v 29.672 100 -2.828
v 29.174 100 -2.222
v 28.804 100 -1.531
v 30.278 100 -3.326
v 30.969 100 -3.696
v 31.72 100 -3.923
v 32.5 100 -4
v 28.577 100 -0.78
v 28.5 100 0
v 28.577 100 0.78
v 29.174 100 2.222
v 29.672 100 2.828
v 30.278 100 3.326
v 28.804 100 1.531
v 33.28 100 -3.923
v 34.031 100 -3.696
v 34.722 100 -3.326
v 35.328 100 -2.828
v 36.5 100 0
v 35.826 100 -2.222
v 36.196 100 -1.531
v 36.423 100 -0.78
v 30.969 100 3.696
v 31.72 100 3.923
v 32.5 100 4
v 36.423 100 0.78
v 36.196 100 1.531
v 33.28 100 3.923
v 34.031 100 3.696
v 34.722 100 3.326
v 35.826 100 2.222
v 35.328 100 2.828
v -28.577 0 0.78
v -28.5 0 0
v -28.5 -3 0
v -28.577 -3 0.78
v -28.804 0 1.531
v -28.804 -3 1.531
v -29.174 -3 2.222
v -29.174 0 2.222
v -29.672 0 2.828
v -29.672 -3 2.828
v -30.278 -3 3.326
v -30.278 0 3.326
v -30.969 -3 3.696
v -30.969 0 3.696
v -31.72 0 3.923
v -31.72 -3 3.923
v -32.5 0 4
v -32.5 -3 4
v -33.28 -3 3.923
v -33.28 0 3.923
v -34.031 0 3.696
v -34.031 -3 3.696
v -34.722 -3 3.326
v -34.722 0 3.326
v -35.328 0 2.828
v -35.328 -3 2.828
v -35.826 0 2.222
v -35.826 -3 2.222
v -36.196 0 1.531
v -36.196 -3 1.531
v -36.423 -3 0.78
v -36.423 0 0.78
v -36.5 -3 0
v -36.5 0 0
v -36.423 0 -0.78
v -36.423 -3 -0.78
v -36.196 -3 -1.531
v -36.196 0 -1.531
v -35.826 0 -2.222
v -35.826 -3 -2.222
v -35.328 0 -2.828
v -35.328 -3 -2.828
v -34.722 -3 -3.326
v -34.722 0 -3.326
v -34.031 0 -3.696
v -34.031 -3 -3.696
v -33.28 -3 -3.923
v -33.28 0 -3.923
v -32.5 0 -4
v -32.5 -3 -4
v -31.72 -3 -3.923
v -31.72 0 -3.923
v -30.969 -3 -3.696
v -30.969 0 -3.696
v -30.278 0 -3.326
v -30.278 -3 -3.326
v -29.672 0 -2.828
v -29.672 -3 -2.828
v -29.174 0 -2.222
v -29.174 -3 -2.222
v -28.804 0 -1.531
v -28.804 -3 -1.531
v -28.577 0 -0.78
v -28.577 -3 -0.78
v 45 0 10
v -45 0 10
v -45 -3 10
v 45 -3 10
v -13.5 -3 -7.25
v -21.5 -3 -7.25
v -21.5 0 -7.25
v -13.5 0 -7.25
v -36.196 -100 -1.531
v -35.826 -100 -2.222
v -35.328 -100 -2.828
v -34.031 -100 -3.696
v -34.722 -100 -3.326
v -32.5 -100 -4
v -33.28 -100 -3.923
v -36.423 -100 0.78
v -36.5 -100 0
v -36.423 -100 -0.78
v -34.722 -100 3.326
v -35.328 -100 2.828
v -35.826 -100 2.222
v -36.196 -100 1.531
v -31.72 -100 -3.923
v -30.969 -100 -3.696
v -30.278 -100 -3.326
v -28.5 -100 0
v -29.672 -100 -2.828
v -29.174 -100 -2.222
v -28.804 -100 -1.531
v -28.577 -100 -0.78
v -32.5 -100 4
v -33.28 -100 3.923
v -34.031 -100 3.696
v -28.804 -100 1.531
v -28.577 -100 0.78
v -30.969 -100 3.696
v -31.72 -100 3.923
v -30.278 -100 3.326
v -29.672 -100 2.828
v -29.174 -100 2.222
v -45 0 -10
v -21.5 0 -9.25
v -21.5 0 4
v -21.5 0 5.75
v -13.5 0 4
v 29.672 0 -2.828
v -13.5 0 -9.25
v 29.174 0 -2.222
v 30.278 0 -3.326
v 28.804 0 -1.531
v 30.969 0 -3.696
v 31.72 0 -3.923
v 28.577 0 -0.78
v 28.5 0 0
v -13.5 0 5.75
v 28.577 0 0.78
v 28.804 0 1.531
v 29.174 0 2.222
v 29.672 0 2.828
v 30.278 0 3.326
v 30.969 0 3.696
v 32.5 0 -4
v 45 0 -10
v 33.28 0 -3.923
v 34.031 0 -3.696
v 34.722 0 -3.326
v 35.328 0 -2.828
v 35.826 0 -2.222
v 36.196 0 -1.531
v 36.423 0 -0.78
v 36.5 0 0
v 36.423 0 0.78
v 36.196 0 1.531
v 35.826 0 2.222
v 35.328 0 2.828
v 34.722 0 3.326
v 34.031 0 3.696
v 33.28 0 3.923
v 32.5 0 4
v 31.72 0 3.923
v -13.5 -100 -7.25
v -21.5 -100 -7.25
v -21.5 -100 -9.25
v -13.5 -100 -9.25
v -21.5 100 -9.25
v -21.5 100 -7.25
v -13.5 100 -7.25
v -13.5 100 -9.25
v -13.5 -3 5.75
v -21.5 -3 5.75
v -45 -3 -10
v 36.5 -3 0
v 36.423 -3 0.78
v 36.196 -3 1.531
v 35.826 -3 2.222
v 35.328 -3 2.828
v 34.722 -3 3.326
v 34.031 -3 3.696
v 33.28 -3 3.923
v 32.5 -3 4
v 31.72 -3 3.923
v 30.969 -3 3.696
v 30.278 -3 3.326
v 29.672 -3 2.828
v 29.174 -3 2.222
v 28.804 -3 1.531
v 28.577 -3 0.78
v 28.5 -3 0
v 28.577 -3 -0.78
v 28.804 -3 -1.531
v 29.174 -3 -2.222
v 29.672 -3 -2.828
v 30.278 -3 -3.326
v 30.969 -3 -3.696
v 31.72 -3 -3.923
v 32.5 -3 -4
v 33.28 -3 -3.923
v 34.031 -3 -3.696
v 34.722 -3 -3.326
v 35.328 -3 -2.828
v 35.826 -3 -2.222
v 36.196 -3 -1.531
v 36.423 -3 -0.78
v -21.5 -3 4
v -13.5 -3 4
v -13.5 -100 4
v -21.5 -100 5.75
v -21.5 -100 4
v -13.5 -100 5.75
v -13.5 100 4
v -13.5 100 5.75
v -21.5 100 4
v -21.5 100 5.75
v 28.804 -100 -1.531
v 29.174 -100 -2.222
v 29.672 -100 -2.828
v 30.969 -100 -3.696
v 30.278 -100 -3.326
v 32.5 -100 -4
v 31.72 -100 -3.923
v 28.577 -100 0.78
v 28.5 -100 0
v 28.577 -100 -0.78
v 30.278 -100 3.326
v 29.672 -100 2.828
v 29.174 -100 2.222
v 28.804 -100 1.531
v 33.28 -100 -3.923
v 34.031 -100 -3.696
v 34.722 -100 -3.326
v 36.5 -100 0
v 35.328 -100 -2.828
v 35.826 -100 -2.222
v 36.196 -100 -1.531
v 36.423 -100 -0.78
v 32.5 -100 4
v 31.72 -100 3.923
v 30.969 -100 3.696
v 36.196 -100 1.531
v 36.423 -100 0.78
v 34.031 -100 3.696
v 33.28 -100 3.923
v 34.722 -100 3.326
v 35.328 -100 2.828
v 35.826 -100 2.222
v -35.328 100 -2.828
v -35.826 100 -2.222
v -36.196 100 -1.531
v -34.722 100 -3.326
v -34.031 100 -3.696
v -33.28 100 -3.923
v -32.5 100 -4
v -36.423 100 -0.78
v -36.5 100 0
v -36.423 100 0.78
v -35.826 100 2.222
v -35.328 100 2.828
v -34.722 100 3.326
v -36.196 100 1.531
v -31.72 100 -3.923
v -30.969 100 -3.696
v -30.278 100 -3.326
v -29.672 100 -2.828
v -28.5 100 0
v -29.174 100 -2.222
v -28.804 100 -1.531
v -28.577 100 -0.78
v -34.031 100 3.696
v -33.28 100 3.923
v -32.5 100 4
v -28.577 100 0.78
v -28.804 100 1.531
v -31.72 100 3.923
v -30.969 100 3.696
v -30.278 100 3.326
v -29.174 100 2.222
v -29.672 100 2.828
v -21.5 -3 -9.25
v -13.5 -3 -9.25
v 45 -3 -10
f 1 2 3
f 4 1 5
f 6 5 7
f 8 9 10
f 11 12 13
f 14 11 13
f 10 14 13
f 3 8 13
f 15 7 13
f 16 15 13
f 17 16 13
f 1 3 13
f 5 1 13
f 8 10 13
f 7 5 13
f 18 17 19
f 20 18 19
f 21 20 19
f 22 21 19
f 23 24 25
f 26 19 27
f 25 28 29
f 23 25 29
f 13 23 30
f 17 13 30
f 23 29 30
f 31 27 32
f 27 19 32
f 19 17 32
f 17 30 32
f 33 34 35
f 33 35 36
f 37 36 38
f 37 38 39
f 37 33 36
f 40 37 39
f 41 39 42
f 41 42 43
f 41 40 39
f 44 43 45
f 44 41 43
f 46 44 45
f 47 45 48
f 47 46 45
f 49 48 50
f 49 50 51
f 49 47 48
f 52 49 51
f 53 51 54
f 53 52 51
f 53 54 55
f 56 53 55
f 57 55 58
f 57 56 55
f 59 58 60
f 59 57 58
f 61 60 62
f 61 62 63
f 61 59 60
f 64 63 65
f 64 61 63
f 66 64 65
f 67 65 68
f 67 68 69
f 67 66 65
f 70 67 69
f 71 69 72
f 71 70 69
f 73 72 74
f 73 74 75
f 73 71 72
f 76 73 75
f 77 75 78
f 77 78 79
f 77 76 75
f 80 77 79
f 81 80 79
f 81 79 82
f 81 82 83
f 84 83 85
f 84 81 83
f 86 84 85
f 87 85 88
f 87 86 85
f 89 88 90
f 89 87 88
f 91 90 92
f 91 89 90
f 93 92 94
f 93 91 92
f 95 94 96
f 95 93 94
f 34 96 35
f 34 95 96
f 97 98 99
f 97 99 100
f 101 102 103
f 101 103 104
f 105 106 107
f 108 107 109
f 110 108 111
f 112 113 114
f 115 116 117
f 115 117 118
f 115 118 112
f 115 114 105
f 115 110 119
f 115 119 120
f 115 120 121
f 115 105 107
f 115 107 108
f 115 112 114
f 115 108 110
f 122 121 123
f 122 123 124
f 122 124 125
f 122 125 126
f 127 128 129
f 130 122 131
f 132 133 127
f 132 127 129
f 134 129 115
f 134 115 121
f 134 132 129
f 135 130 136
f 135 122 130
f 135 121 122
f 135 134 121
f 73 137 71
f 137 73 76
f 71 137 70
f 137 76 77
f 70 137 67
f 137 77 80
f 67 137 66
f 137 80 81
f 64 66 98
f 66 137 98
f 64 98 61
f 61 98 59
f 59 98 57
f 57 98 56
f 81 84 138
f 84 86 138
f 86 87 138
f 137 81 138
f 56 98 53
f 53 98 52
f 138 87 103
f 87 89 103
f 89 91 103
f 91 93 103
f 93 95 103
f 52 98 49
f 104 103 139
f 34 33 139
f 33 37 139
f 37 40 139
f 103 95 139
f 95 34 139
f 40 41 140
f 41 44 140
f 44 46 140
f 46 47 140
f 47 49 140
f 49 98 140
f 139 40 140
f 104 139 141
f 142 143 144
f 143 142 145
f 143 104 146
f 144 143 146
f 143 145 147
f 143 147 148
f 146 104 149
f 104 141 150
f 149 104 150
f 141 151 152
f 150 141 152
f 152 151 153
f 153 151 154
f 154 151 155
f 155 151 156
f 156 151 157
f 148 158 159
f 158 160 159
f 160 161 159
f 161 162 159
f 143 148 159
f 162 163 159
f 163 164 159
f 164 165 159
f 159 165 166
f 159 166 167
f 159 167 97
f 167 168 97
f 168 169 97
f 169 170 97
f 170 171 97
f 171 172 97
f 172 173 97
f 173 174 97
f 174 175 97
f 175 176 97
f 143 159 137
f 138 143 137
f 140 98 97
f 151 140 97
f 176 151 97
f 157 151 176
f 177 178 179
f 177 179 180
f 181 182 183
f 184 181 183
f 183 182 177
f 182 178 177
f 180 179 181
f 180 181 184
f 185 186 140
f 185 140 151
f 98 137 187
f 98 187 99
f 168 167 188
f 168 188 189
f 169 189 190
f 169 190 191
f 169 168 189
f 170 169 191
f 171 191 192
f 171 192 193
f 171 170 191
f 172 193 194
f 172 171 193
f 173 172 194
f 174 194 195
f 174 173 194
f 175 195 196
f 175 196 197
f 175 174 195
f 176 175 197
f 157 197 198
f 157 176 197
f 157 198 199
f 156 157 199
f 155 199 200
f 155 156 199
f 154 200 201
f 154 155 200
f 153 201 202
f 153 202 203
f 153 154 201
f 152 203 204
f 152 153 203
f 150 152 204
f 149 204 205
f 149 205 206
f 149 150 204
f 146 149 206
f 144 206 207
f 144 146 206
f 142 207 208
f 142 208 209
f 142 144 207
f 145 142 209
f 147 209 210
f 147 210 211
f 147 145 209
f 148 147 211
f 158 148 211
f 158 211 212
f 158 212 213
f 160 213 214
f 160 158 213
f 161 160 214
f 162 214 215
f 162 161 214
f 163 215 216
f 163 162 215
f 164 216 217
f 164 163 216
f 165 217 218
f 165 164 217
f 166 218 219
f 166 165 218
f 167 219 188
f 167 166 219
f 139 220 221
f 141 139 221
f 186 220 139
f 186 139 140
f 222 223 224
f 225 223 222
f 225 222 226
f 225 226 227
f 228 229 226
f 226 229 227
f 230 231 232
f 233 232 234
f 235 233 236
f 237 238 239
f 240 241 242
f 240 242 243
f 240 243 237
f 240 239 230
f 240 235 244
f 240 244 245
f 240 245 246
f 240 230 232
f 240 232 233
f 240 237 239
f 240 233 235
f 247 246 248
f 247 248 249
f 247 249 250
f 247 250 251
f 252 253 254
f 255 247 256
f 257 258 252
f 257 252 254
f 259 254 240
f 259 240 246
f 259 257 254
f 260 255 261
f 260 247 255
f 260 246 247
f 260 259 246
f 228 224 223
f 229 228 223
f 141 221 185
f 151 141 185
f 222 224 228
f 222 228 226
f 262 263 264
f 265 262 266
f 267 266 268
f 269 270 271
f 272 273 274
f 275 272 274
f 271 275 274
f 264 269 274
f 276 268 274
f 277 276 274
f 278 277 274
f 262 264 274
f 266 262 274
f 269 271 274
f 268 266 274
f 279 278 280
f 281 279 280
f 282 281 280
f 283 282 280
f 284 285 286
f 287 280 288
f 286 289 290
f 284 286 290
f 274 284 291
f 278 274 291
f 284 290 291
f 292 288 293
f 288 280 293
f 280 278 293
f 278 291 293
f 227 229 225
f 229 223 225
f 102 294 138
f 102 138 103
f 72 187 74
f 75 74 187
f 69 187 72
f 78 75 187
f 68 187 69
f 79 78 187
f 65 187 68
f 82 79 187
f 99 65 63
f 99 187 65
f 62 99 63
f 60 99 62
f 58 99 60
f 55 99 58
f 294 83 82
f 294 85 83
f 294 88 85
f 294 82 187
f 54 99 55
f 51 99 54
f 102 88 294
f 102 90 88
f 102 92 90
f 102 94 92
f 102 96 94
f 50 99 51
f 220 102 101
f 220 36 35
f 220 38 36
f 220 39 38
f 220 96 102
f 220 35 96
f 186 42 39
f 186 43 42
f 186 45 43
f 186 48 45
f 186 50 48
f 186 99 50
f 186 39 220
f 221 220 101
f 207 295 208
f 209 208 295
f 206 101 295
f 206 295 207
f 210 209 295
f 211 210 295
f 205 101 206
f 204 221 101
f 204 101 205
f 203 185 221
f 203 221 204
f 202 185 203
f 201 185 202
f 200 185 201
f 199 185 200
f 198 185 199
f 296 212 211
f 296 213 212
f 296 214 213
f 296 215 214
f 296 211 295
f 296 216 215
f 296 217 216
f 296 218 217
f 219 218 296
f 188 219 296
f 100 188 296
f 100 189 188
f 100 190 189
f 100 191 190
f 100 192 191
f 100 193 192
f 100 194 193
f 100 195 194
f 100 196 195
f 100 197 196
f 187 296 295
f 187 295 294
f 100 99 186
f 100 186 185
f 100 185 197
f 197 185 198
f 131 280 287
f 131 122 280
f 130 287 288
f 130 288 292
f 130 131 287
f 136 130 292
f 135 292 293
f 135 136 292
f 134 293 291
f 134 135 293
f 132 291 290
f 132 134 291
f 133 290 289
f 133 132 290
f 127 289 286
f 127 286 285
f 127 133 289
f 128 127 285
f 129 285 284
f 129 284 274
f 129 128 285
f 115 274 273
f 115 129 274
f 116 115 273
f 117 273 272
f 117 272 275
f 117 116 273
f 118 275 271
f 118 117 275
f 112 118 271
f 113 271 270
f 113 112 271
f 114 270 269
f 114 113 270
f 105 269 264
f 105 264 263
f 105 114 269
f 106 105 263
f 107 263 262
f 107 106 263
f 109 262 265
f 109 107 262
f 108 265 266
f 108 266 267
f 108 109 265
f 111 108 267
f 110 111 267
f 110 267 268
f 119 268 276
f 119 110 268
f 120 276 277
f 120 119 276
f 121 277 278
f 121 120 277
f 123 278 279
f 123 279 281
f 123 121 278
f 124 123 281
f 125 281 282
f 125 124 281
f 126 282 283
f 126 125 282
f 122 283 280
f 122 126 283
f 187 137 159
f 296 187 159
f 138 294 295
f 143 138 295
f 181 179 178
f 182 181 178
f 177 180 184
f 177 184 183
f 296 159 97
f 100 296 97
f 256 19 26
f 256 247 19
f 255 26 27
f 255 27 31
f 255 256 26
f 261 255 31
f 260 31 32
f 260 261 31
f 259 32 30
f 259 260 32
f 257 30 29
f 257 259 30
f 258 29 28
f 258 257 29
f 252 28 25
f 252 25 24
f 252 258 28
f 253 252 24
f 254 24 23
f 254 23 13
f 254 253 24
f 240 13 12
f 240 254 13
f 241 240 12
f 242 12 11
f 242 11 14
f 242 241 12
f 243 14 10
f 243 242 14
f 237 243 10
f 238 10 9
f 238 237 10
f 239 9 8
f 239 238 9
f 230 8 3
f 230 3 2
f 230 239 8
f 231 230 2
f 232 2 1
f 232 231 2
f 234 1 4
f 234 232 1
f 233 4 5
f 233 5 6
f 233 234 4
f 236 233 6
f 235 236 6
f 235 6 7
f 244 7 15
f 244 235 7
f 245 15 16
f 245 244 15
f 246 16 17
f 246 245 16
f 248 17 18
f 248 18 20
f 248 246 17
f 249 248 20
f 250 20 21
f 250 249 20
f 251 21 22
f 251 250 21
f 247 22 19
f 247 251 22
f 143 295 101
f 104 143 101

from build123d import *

# Parameters (mm, degrees)
F0_R     = 4
F1_DEPTH = 100
F0_W     = 8
F0_H     = 1.75
F0_H_2   = 2
F2_W     = 90
F2_H     = 20
F2_R     = 4
F3_DEPTH = 3
F4_W     = 8
F4_H     = 1.75
F4_H_2   = 2
F5_DEPTH = 25


with BuildPart() as f1:
    # F0 (on Front) → F1 (new body, symmetric)
    with BuildSketch(Plane.XZ):
        with Locations((-32.5, 0)):
            Circle(F0_R)
    extrude(amount=F1_DEPTH, both=True)


with BuildPart() as f1b:
    # F0 (on Front) → F1, piece 2 (new body, symmetric)
    with BuildSketch(Plane.XZ):
        with Locations((-17.5, 4.875)):
            Rectangle(F0_W, F0_H)
    extrude(amount=F1_DEPTH, both=True)


with BuildPart() as f1c:
    # F0 (on Front) → F1, piece 3 (new body, symmetric)
    with BuildSketch(Plane.XZ):
        with Locations((-17.5, -8.25)):
            Rectangle(F0_W, F0_H_2)
    extrude(amount=F1_DEPTH, both=True)


with BuildPart() as f1d:
    # F0 (on Front) → F1, piece 4 (new body, symmetric)
    with BuildSketch(Plane.XZ):
        with Locations((32.5, 0)):
            Circle(F0_R)
    extrude(amount=F1_DEPTH, both=True)


with BuildPart() as f3:
    # F2 (on Front) → F3 (new body)
    with BuildSketch(Plane.XZ):
        Rectangle(F2_W, F2_H)
        with Locations((-32.5, 0)):
            Circle(F2_R, mode=Mode.SUBTRACT)
        with Locations((32.5, 0)):
            Circle(F2_R, mode=Mode.SUBTRACT)
    extrude(amount=F3_DEPTH)

    # F4 (on face) → F5 (cut)
    with BuildSketch(Plane.XZ.offset(3)):
        with Locations((-17.5, 4.875)):
            Rectangle(F4_W, F4_H)
        with Locations((-17.5, -8.25)):
            Rectangle(F4_W, F4_H_2)
    extrude(amount=-F5_DEPTH, mode=Mode.SUBTRACT)


solid = Compound([f1.part, f1b.part, f1c.part, f1d.part, f3.part])
